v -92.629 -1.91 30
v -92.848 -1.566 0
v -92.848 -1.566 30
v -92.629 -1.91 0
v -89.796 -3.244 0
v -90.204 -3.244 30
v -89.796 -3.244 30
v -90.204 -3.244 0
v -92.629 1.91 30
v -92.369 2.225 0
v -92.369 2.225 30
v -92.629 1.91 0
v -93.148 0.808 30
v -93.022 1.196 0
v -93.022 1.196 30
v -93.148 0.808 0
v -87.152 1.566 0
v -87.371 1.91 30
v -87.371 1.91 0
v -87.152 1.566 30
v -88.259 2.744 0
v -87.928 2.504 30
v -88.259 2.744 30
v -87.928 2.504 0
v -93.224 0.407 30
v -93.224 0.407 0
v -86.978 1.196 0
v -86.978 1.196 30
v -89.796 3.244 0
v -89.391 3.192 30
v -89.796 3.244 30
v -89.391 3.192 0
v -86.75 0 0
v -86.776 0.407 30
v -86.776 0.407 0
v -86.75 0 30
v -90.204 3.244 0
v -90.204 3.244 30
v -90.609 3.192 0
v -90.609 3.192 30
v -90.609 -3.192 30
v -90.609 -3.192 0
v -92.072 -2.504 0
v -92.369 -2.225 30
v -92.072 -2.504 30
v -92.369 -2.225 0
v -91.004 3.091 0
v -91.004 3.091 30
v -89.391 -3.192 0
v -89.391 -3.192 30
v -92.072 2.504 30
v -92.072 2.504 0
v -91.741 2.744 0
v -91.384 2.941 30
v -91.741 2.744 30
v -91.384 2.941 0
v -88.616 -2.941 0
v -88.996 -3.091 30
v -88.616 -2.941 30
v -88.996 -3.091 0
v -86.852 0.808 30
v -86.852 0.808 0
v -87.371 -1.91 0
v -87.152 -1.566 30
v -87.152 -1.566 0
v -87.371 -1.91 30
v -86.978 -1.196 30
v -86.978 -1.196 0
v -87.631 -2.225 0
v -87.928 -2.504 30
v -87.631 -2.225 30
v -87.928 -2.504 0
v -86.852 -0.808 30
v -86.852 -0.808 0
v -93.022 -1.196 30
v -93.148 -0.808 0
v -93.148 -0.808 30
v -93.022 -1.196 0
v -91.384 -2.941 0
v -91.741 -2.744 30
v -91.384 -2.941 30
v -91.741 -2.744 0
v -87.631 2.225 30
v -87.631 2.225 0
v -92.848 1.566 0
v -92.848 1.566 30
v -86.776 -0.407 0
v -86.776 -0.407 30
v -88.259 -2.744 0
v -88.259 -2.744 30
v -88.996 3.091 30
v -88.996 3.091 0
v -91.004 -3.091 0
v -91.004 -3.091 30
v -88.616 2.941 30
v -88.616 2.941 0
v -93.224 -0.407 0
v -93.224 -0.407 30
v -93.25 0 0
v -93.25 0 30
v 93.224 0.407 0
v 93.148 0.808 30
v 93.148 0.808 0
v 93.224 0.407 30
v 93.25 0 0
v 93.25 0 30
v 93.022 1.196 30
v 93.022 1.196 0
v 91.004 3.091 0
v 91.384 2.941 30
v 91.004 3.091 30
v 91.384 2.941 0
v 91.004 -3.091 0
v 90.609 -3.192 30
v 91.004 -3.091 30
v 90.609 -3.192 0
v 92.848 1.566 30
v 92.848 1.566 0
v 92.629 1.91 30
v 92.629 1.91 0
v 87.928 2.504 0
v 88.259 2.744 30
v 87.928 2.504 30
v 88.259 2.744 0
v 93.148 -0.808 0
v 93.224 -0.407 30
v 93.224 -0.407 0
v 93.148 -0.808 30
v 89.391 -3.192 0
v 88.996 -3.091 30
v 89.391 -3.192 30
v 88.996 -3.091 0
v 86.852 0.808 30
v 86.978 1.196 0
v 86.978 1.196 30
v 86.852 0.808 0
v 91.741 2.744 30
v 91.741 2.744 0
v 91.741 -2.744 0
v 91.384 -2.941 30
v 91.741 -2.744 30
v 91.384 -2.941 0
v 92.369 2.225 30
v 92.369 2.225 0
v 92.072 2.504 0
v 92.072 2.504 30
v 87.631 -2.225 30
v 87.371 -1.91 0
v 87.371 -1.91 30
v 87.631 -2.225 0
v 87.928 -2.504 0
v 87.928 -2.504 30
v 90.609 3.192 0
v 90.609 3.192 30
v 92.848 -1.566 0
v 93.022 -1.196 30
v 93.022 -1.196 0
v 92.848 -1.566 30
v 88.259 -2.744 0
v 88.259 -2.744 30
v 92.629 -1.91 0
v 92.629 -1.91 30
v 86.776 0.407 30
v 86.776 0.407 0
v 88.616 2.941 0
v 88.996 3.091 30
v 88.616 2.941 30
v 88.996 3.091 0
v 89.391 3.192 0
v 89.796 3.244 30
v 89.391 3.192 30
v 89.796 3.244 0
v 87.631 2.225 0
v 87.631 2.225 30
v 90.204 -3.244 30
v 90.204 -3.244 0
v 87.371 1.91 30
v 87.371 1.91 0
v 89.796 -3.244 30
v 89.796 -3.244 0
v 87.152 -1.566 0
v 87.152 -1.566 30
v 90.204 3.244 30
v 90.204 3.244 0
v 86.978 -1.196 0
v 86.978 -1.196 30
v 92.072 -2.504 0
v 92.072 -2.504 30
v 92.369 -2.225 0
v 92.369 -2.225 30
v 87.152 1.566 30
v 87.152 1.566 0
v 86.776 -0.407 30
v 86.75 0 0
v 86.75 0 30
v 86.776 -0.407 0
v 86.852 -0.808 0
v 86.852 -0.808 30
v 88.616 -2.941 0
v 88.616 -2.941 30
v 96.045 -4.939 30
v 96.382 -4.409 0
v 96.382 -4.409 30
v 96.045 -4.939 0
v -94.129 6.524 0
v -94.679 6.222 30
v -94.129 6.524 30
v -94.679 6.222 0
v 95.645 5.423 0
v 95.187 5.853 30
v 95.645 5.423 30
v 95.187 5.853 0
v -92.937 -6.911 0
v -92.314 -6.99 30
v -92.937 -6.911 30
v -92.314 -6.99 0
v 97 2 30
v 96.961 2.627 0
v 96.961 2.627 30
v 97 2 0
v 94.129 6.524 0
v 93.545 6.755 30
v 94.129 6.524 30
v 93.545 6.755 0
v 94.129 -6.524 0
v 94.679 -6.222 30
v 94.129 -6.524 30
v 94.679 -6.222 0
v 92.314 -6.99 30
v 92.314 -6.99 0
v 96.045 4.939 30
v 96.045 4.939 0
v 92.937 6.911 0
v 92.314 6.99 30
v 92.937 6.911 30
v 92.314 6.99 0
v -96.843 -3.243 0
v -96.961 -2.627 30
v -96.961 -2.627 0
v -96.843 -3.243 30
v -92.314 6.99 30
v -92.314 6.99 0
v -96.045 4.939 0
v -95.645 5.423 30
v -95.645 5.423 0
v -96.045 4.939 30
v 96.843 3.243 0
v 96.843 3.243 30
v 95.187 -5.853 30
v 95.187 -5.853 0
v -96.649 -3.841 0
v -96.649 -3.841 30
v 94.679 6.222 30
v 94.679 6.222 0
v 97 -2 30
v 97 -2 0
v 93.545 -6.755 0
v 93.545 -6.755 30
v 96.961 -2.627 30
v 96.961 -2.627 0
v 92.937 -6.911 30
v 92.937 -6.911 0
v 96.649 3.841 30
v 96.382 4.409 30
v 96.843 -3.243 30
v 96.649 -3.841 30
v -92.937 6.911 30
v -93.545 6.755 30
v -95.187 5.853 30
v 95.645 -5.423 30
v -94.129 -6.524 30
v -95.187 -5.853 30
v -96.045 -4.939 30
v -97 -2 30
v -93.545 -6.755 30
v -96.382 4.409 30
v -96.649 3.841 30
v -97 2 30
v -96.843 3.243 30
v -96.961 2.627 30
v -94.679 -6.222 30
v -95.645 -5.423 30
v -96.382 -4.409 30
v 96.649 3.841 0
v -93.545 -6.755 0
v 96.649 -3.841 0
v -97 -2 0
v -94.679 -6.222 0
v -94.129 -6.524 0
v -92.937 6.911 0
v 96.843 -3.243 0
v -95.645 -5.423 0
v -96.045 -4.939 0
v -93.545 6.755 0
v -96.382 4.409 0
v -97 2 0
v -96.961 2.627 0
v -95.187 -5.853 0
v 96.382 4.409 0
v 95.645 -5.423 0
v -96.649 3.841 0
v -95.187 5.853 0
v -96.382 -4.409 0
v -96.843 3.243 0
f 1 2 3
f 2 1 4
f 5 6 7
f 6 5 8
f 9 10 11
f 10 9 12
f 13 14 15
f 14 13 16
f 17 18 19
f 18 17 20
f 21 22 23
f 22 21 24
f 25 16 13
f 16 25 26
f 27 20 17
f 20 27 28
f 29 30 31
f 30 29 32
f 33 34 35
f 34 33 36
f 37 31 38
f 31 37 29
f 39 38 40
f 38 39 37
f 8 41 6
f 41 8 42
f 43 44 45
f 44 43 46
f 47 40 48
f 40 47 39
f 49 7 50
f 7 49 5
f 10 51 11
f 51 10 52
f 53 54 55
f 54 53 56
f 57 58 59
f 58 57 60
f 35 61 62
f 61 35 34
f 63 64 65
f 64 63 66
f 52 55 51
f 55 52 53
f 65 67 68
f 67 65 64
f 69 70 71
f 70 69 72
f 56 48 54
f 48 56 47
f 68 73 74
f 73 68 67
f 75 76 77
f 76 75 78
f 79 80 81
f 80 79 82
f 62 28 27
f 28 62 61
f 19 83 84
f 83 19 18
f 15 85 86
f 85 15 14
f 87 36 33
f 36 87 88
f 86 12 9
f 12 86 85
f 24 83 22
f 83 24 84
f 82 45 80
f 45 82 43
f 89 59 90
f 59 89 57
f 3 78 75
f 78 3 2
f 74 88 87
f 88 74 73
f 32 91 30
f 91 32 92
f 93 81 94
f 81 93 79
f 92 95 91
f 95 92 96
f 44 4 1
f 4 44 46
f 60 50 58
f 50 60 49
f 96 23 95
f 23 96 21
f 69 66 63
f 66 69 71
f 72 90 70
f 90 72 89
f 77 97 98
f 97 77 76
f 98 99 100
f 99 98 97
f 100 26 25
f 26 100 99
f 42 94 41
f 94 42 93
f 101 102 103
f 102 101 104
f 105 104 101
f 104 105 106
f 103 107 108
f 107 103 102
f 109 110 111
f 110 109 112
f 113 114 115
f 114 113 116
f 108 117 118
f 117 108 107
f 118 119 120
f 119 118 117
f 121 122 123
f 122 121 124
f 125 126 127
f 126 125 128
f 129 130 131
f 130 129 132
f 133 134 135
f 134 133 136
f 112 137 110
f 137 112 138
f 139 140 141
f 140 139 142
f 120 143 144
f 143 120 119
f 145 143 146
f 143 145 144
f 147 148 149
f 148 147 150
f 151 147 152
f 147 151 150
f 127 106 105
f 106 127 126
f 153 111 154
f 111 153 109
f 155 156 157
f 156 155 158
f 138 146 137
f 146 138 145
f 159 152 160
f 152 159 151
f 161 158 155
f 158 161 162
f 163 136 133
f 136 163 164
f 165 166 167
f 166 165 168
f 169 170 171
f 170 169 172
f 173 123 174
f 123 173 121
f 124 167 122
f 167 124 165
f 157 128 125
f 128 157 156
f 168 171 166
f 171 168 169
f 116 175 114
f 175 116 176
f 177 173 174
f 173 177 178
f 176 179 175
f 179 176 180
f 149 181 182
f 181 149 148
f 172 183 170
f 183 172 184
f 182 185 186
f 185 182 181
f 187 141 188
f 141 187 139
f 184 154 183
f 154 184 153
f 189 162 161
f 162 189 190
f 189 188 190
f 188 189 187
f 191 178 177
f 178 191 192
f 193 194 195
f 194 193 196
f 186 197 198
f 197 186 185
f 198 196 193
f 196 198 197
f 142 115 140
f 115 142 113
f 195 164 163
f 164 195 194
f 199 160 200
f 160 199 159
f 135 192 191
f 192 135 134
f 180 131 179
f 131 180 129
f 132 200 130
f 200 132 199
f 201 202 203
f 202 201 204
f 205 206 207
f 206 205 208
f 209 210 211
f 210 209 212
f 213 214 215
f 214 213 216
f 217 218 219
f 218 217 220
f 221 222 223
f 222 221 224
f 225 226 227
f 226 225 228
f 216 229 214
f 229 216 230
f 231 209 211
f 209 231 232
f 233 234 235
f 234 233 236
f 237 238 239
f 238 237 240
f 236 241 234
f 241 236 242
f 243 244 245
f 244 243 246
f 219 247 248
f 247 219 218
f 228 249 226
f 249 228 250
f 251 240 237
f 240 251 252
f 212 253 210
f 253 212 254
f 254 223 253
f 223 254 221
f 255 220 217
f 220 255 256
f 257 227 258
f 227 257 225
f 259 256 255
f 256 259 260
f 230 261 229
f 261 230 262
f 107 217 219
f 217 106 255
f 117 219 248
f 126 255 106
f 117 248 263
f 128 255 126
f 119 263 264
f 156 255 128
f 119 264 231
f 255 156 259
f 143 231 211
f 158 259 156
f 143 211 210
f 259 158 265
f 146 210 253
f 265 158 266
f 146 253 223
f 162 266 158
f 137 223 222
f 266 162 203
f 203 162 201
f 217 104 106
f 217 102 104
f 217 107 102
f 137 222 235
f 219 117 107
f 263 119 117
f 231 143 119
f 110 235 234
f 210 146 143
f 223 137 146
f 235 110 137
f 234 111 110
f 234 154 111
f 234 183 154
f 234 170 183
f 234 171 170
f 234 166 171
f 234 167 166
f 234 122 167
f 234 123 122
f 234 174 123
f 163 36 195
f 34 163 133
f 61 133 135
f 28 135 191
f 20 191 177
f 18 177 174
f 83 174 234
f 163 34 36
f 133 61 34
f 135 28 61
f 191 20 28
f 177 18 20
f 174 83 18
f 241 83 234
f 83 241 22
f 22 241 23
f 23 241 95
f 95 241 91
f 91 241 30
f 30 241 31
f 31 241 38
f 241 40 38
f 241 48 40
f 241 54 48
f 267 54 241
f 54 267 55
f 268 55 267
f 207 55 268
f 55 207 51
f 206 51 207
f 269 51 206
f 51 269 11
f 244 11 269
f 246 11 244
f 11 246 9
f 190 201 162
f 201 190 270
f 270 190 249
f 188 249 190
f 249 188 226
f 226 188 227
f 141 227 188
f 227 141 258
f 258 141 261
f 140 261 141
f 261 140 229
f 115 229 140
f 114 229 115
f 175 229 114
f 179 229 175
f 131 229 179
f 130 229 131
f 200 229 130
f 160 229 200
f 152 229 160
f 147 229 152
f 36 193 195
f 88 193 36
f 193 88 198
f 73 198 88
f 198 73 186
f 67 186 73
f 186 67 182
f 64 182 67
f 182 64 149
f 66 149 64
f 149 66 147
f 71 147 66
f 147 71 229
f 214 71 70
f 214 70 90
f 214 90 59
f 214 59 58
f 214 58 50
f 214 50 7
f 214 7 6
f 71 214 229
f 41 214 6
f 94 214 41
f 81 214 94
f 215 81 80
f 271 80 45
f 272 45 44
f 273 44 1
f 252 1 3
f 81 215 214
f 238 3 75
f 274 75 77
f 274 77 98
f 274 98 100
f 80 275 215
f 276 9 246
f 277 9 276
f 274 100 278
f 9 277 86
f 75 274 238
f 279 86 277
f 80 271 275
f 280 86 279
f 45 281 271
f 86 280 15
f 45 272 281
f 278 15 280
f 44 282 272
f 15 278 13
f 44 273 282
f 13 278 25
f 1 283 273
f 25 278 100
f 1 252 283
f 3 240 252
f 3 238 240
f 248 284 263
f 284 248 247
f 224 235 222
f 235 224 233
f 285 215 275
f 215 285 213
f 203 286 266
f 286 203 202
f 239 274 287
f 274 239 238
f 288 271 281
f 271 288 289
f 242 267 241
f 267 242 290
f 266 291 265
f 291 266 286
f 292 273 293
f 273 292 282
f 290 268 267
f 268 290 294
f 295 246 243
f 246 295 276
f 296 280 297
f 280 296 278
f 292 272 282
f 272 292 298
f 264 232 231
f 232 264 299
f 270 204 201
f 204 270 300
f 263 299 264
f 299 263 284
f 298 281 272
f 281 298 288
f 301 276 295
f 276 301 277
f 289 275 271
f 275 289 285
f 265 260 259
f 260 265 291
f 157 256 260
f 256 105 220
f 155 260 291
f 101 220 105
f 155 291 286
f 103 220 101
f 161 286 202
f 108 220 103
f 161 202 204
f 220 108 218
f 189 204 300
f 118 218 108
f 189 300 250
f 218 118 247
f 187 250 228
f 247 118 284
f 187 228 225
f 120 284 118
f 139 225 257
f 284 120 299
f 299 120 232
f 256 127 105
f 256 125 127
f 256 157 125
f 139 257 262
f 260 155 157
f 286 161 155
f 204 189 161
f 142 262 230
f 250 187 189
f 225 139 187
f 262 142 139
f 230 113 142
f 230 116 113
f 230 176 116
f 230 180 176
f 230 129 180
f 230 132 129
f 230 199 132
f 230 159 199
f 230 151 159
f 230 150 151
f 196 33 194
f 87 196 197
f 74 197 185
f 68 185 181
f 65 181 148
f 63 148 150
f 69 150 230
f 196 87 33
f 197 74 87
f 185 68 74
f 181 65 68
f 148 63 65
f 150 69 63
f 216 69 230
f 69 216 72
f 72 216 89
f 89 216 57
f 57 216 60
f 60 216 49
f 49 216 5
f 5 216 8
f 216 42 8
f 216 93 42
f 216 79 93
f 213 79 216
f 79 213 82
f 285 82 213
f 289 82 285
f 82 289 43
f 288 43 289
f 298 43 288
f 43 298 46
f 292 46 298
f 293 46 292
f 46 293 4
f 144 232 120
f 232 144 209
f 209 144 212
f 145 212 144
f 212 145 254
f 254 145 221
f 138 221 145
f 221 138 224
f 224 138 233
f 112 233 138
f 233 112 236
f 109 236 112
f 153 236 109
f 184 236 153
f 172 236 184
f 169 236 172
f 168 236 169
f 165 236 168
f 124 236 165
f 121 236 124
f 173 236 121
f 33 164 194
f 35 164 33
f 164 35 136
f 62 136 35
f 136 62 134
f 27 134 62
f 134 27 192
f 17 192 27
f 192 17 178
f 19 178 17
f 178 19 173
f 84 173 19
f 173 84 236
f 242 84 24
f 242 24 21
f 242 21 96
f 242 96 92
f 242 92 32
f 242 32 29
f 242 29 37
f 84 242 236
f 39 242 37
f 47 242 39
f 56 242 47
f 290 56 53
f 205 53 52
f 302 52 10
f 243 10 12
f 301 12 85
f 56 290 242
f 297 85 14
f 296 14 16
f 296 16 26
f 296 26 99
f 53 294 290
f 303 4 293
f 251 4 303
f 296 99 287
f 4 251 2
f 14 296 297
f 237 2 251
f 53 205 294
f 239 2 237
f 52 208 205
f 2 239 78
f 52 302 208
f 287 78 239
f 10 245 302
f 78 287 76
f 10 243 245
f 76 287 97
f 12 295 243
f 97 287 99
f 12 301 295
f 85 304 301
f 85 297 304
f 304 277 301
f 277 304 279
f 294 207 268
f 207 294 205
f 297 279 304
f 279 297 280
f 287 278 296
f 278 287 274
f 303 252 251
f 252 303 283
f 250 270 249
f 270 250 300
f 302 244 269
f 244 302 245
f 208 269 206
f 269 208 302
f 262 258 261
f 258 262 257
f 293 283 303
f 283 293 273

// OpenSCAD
$fn = 50;


difference() {
	union() {
		hull() {
			translate(v = [-92.0000000000, 2.0000000000, 0]) {
				cylinder(h = 30, r = 5);
			}
			translate(v = [92.0000000000, 2.0000000000, 0]) {
				cylinder(h = 30, r = 5);
			}
			translate(v = [-92.0000000000, -2.0000000000, 0]) {
				cylinder(h = 30, r = 5);
			}
			translate(v = [92.0000000000, -2.0000000000, 0]) {
				cylinder(h = 30, r = 5);
			}
		}
	}
	union() {
		translate(v = [-90.0000000000, 0.0000000000, -100.0000000000]) {
			cylinder(h = 200, r = 3.2500000000);
		}
		translate(v = [-90.0000000000, 0.0000000000, -100.0000000000]) {
			cylinder(h = 200, r = 3.2500000000);
		}
		translate(v = [90.0000000000, 0.0000000000, -100.0000000000]) {
			cylinder(h = 200, r = 3.2500000000);
		}
		translate(v = [90.0000000000, 0.0000000000, -100.0000000000]) {
			cylinder(h = 200, r = 3.2500000000);
		}
	}
}
